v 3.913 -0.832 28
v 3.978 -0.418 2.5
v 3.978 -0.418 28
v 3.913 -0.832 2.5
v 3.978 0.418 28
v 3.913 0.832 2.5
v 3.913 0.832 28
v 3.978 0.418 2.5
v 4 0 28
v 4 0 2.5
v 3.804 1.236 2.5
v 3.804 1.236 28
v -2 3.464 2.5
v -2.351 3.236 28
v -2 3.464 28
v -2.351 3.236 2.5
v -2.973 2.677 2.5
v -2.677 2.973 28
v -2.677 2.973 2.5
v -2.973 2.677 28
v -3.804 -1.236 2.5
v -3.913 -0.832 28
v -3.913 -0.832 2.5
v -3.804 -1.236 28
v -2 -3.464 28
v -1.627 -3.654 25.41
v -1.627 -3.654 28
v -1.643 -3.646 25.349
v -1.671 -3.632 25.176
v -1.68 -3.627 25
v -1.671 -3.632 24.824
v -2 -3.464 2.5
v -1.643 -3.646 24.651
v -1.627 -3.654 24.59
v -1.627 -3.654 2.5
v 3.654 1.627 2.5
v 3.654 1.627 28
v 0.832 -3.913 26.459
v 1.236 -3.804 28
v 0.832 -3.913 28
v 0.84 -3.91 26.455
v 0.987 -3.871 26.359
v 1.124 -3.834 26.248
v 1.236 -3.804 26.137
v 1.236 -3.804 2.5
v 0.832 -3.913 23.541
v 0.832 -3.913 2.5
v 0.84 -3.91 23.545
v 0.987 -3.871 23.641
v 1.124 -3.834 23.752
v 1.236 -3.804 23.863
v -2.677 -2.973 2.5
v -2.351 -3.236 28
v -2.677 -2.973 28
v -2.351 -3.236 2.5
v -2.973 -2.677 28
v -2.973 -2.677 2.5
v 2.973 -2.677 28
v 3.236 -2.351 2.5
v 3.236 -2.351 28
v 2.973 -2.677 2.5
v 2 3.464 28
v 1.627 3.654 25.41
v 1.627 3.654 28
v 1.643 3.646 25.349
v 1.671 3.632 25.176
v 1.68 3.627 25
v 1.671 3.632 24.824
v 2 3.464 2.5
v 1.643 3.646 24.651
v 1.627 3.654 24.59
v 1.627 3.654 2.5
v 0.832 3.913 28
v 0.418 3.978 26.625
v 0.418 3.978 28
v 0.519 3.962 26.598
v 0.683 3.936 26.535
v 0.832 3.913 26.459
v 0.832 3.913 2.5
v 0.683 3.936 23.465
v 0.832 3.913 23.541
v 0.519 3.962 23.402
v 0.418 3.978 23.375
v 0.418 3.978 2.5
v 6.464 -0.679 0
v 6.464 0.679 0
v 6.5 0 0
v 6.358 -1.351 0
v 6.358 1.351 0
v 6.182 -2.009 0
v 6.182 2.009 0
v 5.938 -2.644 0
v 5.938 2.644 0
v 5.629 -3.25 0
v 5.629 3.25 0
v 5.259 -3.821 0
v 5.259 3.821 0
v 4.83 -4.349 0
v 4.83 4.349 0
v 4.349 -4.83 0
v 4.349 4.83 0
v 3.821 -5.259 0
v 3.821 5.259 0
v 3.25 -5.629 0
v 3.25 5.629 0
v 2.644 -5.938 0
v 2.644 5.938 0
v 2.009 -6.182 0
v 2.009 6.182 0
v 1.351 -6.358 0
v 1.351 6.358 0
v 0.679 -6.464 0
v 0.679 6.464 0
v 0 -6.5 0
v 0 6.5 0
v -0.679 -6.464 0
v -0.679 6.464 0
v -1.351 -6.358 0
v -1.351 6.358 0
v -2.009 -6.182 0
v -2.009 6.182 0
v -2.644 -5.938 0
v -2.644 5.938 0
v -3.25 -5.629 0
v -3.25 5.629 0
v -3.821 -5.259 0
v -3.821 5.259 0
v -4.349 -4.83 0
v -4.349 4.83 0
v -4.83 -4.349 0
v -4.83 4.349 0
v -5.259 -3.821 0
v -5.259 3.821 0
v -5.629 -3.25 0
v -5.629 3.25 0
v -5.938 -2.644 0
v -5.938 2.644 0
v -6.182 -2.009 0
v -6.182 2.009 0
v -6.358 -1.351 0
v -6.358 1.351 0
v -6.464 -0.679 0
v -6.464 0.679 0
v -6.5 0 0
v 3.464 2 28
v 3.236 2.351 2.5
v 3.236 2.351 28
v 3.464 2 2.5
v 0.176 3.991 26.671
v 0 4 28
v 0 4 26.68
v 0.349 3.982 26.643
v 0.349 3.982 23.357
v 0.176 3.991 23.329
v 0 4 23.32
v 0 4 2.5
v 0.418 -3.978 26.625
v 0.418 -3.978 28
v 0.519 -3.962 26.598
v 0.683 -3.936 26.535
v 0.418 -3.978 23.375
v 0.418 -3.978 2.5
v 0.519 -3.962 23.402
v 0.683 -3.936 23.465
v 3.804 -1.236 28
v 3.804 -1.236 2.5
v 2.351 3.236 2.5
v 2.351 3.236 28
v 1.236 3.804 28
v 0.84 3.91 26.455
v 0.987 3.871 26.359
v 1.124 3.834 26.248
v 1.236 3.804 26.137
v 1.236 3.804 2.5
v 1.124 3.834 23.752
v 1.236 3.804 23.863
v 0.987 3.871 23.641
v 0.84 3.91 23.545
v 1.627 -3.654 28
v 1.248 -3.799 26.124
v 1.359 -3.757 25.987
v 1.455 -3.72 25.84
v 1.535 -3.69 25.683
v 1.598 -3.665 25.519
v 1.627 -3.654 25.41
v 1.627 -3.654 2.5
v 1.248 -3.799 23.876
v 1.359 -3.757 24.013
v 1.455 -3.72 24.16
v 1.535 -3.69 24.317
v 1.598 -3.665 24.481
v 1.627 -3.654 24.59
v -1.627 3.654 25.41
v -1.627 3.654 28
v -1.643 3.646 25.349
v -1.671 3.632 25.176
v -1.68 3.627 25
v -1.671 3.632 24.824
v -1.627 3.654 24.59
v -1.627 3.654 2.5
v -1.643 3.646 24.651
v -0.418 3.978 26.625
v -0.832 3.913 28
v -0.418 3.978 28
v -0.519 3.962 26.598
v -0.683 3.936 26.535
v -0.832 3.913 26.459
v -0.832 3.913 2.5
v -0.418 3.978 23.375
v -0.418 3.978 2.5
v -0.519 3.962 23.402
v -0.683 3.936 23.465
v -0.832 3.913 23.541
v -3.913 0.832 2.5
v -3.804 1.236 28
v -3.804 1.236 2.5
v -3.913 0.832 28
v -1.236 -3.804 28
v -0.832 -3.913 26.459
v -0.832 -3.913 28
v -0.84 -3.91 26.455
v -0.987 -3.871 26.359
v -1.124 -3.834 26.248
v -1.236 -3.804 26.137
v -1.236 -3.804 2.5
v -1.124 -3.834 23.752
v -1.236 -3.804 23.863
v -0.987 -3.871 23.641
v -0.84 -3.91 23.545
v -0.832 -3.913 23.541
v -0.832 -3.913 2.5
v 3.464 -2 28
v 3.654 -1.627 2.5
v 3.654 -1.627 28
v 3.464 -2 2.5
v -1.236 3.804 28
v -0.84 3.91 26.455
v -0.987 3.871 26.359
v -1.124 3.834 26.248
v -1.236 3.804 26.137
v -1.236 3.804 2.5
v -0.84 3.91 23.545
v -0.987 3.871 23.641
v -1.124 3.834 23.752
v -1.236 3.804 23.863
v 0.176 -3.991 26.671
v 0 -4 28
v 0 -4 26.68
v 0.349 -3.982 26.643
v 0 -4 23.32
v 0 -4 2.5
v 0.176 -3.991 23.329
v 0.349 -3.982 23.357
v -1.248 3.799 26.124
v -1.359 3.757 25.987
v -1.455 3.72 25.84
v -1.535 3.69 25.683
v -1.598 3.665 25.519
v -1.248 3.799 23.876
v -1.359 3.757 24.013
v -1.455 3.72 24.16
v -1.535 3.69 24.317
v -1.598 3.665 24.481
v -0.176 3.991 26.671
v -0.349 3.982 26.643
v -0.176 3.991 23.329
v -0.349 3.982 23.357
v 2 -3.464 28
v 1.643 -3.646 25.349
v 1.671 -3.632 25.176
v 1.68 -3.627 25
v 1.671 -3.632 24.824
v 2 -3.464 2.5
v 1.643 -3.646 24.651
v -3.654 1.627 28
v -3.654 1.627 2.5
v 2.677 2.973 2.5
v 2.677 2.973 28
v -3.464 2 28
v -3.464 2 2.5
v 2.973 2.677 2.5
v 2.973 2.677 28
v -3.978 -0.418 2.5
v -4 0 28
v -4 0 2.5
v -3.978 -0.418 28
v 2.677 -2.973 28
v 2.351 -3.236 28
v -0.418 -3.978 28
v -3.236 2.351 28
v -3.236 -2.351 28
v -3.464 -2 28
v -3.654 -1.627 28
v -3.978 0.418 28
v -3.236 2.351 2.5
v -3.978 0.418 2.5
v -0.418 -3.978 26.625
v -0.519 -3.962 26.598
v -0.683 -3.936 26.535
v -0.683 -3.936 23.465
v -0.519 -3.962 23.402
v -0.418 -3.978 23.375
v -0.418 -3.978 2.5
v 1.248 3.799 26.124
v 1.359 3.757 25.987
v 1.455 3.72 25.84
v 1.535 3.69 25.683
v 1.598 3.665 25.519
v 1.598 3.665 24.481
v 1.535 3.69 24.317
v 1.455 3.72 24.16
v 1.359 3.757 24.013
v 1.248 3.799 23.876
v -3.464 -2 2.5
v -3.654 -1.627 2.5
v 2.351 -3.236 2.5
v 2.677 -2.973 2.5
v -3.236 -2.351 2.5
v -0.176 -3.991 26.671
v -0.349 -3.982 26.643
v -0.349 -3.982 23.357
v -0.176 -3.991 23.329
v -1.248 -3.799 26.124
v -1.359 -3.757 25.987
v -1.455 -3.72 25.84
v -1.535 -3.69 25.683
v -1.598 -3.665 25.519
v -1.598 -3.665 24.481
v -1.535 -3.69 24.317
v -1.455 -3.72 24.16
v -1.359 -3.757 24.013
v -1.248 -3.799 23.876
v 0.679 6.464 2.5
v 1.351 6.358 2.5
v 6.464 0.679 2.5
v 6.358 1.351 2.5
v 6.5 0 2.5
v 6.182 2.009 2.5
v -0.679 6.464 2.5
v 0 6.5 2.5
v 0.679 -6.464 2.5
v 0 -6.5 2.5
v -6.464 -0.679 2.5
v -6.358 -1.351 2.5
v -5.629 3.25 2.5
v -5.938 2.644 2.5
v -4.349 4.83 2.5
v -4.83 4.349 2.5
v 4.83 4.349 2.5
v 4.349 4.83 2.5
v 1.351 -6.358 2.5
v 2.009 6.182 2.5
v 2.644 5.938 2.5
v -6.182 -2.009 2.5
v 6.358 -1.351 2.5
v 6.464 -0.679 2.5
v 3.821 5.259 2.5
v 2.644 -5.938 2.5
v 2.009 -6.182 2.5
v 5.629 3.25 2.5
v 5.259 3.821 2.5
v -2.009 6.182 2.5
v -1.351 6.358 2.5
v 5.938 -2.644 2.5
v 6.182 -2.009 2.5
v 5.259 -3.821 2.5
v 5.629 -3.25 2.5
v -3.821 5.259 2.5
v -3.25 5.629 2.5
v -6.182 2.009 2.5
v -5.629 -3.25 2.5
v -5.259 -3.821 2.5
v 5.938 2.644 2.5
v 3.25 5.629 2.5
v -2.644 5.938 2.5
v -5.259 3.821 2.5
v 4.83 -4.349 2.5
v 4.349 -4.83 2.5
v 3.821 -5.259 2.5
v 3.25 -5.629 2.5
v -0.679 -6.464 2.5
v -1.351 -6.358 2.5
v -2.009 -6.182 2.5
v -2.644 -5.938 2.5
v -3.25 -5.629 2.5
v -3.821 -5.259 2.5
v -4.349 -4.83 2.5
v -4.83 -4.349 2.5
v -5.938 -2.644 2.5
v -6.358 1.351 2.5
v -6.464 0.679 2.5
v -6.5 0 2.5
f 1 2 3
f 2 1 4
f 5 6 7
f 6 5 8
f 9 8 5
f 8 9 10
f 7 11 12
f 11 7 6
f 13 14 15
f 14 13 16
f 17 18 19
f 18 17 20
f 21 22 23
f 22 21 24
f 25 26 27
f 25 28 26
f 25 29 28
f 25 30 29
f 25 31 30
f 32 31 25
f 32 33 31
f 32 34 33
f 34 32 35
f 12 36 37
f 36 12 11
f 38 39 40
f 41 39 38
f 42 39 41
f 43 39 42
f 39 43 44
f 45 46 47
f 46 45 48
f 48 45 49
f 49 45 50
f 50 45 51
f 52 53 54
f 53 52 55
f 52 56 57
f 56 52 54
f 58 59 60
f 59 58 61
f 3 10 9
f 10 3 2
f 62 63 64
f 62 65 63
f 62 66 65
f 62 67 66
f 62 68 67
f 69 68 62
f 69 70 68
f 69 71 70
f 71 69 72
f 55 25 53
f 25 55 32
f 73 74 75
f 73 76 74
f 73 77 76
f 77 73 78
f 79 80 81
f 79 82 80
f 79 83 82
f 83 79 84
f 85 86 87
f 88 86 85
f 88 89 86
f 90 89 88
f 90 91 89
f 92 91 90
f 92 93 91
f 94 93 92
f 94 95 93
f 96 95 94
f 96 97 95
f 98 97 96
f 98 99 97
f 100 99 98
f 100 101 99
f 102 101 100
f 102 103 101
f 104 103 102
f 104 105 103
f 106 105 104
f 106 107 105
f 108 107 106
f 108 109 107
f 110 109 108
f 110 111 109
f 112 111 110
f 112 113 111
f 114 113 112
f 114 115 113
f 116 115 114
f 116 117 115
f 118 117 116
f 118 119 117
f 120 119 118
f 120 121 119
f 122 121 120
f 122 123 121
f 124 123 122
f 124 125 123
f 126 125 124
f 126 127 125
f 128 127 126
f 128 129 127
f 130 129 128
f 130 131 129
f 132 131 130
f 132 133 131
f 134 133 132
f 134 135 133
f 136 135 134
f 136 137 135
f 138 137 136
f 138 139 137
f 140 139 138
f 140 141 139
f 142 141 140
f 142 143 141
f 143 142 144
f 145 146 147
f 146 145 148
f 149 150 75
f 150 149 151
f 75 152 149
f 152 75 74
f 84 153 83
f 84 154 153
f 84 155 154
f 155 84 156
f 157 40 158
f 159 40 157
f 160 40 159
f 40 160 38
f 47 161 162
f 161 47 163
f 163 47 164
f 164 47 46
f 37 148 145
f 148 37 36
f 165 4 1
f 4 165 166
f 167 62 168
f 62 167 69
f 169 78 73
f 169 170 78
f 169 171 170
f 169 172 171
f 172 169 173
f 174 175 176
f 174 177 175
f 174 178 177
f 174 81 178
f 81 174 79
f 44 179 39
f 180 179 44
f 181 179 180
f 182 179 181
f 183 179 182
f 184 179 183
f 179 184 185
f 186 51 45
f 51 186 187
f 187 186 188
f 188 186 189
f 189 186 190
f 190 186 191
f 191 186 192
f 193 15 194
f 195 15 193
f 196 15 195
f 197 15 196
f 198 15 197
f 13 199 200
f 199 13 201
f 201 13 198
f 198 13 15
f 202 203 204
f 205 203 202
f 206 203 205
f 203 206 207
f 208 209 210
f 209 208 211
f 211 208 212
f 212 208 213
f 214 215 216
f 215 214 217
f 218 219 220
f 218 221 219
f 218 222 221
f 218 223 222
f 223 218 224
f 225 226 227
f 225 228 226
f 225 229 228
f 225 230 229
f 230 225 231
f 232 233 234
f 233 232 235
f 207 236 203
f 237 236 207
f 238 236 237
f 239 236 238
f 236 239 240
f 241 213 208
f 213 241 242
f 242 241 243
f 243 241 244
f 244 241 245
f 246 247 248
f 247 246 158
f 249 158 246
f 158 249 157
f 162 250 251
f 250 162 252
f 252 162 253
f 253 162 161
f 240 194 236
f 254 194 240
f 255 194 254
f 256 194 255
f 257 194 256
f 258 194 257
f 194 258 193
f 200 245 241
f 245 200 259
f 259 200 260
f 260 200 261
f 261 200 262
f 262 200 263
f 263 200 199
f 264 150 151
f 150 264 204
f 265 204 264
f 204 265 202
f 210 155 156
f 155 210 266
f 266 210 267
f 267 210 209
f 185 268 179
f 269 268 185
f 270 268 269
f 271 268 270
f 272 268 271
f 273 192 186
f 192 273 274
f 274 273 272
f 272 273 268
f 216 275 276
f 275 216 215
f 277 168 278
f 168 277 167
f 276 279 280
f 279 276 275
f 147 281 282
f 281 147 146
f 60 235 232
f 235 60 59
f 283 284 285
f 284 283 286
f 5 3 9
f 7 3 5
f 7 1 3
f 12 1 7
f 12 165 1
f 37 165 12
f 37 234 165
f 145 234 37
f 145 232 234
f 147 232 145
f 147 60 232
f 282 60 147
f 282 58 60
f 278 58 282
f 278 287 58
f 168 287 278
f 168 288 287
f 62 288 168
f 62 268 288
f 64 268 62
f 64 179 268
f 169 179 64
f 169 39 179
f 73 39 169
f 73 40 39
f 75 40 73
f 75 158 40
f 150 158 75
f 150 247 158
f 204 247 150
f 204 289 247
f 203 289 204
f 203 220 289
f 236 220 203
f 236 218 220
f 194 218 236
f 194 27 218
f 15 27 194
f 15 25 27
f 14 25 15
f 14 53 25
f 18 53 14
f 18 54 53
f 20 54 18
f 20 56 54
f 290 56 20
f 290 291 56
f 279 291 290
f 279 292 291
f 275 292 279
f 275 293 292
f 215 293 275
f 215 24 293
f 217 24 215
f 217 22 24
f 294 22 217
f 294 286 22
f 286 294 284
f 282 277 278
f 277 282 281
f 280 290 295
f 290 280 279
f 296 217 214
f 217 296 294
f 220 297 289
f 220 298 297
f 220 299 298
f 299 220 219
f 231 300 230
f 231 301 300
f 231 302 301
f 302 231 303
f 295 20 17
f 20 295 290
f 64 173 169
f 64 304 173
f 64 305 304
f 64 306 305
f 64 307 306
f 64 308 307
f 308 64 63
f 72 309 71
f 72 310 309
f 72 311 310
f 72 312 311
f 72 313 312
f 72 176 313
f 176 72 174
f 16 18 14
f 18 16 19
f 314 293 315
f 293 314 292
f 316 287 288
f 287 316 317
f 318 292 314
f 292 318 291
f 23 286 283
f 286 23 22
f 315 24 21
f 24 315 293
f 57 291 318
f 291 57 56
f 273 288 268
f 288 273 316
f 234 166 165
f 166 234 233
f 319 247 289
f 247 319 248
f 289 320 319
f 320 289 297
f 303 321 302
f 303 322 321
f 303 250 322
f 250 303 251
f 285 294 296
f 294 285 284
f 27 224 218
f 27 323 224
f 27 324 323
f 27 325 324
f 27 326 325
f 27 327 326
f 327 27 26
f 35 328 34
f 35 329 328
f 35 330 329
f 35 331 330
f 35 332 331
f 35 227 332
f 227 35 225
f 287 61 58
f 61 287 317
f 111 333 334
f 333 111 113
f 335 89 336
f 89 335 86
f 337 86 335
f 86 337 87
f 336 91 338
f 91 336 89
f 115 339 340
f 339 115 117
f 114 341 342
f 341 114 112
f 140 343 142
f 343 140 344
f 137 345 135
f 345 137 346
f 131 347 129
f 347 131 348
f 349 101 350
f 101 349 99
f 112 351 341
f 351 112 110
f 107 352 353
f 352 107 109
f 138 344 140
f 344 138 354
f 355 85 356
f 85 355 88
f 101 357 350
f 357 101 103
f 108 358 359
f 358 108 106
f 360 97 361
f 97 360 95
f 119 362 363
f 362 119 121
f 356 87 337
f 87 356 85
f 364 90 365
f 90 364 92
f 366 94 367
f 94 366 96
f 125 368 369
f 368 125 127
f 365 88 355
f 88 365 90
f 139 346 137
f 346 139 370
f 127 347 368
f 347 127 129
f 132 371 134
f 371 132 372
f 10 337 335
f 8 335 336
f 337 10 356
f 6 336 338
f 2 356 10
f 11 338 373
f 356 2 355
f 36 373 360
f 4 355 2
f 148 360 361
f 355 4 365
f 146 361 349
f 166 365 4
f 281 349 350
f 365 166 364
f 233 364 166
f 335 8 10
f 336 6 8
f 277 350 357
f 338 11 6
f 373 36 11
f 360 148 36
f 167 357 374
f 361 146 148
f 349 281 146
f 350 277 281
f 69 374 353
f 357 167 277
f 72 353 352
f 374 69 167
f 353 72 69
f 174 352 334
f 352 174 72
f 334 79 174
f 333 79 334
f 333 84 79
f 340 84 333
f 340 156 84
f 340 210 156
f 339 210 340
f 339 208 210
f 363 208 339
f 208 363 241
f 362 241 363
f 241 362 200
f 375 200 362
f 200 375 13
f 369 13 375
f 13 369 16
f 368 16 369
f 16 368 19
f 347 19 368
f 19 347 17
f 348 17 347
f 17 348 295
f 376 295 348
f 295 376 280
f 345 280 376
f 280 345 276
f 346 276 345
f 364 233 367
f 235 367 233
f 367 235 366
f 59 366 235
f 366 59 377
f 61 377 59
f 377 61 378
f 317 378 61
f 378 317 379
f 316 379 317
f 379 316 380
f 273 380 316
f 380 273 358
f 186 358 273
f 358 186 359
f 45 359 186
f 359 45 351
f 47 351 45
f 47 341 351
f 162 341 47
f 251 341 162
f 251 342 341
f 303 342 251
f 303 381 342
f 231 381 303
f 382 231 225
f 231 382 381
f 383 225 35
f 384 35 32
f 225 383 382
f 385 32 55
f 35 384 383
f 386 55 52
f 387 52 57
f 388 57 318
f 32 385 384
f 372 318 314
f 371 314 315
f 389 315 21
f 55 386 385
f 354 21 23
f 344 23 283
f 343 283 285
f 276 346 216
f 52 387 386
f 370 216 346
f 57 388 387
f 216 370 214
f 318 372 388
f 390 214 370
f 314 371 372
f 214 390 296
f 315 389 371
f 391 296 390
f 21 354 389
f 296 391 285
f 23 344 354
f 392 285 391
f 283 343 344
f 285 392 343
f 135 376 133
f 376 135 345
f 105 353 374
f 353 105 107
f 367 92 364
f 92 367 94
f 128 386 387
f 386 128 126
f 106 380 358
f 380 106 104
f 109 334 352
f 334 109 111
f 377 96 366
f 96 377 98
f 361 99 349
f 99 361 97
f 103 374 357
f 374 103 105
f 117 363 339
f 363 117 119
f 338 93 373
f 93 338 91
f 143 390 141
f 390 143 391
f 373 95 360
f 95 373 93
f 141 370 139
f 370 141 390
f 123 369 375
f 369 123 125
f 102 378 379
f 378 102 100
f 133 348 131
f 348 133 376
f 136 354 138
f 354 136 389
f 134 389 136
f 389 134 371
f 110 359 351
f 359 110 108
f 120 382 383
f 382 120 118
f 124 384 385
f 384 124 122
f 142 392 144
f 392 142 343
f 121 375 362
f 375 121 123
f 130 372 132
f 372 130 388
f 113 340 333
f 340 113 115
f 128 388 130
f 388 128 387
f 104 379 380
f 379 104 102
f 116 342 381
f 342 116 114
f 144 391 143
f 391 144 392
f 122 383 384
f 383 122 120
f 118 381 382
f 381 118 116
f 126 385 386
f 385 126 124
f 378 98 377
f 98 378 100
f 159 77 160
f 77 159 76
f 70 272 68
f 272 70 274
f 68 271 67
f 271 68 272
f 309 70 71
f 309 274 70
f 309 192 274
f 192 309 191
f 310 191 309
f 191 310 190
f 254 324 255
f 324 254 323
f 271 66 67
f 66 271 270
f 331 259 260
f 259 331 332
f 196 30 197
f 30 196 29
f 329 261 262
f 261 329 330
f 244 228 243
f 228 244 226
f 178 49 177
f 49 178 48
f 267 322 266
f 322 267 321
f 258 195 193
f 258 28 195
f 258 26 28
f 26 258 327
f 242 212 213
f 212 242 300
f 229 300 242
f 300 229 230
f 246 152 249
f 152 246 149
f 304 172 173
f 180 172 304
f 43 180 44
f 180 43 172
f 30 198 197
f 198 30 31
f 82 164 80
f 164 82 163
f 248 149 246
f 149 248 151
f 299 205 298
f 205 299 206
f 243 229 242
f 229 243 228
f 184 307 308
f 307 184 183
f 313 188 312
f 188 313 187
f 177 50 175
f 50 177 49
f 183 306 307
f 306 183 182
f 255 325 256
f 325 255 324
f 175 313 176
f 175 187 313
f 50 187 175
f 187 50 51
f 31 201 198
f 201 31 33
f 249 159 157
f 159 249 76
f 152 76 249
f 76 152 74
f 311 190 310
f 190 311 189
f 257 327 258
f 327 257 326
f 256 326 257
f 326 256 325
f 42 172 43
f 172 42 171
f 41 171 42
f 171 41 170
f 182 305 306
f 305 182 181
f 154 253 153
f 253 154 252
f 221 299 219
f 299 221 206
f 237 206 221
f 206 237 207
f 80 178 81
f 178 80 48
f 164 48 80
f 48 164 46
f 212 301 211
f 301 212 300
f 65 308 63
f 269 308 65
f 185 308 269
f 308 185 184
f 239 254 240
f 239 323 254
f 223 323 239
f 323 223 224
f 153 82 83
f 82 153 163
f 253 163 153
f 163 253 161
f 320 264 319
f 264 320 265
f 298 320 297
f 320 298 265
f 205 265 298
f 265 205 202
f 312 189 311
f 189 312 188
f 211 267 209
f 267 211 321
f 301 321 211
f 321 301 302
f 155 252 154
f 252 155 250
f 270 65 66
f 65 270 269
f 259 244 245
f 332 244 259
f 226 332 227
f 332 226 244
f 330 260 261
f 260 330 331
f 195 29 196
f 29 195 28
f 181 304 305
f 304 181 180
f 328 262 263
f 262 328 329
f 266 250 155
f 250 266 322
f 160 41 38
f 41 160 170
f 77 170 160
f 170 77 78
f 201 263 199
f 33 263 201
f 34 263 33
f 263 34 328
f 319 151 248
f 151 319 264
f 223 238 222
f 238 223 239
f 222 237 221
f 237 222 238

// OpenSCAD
// Clevis pin with cross-hole.
$fn = 60;
eps = 0.02;
pin_d = 8;
pin_l = 28;
head_d = pin_d + 5;
difference() {
    union() { cylinder(d=pin_d,h=pin_l); cylinder(d=head_d,h=2.5); }
    translate([0,-pin_d-eps,pin_l-3]) rotate([-90,0,0]) cylinder(d=pin_d*0.42,h=2*pin_d+2*eps);
}
